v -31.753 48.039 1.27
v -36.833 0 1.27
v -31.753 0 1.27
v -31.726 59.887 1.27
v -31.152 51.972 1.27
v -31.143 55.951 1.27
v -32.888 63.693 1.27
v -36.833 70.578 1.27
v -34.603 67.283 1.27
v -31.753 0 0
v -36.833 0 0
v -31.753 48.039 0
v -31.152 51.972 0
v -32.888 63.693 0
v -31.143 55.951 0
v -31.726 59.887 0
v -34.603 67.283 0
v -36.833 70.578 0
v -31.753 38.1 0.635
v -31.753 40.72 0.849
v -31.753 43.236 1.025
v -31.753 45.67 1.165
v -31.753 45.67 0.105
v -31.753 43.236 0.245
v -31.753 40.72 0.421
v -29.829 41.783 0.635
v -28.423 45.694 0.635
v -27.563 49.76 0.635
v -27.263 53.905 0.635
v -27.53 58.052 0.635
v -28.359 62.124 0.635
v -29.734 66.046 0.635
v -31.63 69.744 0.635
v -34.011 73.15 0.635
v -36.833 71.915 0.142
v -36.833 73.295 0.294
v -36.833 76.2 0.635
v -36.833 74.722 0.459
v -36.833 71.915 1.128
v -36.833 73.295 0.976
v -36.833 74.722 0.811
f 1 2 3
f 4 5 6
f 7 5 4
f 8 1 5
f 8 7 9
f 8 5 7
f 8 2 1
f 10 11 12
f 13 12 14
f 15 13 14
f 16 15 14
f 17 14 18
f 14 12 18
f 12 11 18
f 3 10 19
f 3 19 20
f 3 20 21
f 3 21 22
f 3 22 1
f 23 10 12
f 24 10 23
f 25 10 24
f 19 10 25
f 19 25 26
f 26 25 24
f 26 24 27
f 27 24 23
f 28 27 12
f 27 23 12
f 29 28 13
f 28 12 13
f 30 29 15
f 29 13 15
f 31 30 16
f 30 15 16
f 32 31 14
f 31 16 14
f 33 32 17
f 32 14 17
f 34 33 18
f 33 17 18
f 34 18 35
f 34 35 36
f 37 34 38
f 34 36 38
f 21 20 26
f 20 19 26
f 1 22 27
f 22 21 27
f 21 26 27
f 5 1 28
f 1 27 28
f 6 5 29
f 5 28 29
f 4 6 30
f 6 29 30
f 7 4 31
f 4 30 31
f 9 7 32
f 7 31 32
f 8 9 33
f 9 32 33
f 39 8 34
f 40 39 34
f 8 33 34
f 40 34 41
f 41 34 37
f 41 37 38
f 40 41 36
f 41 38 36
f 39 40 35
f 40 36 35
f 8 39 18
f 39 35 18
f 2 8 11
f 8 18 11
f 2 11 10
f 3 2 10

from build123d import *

# Parameters (mm, degrees)
F1_DEPTH = 1.27
F2_SIZE2 = 0.635
F2_SIZE  = 3.81
F3_SIZE2 = 3.80999
F3_SIZE  = 0.63499


# Not quite as in the source:
# - a fillet or chamfer is up to 0.001 mm smaller than in the source, because OpenCascade refuses the exact size


with BuildPart() as f1:
    # F0 (on Top) → F1 (new body)
    with BuildSketch(Plane.XY):
        with BuildLine():
            Line((-36.8330654015, 25.4), (-36.8330654015, 0))
            Line((-36.8330654015, 0), (-31.7530654015, 0))
            Line((-31.7530654015, 0), (-31.7530654015, 25.4))
            Line((-31.7530654015, 25.4), (-31.7530654015, 38.1))
            ThreePointArc((-31.7530654015, 38.1), (-27.5303919686, 58.0516897911), (-36.8330654015, 76.2))
            Line((-36.8330654015, 76.2), (-36.8330654015, 25.4))
        make_face()
    extrude(amount=F1_DEPTH)

    # F2
    f2_edges = [f1.edges().sort_by_distance(p)[0] for p in [
        (-27.530392, 58.05169, 1.27),
    ]]
    f2_side = f1.faces().sort_by_distance((-33.424726, 40.272923, 1.27))[0]
    chamfer(f2_edges, length=F2_SIZE, length2=F2_SIZE2, reference=f2_side)

    # F3 (size 0.635 and 3.81 in the source; OpenCascade refuses exactly that, so slightly less here)
    f3_edges = [f1.edges().sort_by_distance(p)[0] for p in [
        (-27.530392, 58.05169, 0),
    ]]
    f3_side = f1.faces().sort_by_distance((-27.530392, 58.05169, 0.3175))[0]
    chamfer(f3_edges, length=F3_SIZE, length2=F3_SIZE2, reference=f3_side)


solid = f1.part
